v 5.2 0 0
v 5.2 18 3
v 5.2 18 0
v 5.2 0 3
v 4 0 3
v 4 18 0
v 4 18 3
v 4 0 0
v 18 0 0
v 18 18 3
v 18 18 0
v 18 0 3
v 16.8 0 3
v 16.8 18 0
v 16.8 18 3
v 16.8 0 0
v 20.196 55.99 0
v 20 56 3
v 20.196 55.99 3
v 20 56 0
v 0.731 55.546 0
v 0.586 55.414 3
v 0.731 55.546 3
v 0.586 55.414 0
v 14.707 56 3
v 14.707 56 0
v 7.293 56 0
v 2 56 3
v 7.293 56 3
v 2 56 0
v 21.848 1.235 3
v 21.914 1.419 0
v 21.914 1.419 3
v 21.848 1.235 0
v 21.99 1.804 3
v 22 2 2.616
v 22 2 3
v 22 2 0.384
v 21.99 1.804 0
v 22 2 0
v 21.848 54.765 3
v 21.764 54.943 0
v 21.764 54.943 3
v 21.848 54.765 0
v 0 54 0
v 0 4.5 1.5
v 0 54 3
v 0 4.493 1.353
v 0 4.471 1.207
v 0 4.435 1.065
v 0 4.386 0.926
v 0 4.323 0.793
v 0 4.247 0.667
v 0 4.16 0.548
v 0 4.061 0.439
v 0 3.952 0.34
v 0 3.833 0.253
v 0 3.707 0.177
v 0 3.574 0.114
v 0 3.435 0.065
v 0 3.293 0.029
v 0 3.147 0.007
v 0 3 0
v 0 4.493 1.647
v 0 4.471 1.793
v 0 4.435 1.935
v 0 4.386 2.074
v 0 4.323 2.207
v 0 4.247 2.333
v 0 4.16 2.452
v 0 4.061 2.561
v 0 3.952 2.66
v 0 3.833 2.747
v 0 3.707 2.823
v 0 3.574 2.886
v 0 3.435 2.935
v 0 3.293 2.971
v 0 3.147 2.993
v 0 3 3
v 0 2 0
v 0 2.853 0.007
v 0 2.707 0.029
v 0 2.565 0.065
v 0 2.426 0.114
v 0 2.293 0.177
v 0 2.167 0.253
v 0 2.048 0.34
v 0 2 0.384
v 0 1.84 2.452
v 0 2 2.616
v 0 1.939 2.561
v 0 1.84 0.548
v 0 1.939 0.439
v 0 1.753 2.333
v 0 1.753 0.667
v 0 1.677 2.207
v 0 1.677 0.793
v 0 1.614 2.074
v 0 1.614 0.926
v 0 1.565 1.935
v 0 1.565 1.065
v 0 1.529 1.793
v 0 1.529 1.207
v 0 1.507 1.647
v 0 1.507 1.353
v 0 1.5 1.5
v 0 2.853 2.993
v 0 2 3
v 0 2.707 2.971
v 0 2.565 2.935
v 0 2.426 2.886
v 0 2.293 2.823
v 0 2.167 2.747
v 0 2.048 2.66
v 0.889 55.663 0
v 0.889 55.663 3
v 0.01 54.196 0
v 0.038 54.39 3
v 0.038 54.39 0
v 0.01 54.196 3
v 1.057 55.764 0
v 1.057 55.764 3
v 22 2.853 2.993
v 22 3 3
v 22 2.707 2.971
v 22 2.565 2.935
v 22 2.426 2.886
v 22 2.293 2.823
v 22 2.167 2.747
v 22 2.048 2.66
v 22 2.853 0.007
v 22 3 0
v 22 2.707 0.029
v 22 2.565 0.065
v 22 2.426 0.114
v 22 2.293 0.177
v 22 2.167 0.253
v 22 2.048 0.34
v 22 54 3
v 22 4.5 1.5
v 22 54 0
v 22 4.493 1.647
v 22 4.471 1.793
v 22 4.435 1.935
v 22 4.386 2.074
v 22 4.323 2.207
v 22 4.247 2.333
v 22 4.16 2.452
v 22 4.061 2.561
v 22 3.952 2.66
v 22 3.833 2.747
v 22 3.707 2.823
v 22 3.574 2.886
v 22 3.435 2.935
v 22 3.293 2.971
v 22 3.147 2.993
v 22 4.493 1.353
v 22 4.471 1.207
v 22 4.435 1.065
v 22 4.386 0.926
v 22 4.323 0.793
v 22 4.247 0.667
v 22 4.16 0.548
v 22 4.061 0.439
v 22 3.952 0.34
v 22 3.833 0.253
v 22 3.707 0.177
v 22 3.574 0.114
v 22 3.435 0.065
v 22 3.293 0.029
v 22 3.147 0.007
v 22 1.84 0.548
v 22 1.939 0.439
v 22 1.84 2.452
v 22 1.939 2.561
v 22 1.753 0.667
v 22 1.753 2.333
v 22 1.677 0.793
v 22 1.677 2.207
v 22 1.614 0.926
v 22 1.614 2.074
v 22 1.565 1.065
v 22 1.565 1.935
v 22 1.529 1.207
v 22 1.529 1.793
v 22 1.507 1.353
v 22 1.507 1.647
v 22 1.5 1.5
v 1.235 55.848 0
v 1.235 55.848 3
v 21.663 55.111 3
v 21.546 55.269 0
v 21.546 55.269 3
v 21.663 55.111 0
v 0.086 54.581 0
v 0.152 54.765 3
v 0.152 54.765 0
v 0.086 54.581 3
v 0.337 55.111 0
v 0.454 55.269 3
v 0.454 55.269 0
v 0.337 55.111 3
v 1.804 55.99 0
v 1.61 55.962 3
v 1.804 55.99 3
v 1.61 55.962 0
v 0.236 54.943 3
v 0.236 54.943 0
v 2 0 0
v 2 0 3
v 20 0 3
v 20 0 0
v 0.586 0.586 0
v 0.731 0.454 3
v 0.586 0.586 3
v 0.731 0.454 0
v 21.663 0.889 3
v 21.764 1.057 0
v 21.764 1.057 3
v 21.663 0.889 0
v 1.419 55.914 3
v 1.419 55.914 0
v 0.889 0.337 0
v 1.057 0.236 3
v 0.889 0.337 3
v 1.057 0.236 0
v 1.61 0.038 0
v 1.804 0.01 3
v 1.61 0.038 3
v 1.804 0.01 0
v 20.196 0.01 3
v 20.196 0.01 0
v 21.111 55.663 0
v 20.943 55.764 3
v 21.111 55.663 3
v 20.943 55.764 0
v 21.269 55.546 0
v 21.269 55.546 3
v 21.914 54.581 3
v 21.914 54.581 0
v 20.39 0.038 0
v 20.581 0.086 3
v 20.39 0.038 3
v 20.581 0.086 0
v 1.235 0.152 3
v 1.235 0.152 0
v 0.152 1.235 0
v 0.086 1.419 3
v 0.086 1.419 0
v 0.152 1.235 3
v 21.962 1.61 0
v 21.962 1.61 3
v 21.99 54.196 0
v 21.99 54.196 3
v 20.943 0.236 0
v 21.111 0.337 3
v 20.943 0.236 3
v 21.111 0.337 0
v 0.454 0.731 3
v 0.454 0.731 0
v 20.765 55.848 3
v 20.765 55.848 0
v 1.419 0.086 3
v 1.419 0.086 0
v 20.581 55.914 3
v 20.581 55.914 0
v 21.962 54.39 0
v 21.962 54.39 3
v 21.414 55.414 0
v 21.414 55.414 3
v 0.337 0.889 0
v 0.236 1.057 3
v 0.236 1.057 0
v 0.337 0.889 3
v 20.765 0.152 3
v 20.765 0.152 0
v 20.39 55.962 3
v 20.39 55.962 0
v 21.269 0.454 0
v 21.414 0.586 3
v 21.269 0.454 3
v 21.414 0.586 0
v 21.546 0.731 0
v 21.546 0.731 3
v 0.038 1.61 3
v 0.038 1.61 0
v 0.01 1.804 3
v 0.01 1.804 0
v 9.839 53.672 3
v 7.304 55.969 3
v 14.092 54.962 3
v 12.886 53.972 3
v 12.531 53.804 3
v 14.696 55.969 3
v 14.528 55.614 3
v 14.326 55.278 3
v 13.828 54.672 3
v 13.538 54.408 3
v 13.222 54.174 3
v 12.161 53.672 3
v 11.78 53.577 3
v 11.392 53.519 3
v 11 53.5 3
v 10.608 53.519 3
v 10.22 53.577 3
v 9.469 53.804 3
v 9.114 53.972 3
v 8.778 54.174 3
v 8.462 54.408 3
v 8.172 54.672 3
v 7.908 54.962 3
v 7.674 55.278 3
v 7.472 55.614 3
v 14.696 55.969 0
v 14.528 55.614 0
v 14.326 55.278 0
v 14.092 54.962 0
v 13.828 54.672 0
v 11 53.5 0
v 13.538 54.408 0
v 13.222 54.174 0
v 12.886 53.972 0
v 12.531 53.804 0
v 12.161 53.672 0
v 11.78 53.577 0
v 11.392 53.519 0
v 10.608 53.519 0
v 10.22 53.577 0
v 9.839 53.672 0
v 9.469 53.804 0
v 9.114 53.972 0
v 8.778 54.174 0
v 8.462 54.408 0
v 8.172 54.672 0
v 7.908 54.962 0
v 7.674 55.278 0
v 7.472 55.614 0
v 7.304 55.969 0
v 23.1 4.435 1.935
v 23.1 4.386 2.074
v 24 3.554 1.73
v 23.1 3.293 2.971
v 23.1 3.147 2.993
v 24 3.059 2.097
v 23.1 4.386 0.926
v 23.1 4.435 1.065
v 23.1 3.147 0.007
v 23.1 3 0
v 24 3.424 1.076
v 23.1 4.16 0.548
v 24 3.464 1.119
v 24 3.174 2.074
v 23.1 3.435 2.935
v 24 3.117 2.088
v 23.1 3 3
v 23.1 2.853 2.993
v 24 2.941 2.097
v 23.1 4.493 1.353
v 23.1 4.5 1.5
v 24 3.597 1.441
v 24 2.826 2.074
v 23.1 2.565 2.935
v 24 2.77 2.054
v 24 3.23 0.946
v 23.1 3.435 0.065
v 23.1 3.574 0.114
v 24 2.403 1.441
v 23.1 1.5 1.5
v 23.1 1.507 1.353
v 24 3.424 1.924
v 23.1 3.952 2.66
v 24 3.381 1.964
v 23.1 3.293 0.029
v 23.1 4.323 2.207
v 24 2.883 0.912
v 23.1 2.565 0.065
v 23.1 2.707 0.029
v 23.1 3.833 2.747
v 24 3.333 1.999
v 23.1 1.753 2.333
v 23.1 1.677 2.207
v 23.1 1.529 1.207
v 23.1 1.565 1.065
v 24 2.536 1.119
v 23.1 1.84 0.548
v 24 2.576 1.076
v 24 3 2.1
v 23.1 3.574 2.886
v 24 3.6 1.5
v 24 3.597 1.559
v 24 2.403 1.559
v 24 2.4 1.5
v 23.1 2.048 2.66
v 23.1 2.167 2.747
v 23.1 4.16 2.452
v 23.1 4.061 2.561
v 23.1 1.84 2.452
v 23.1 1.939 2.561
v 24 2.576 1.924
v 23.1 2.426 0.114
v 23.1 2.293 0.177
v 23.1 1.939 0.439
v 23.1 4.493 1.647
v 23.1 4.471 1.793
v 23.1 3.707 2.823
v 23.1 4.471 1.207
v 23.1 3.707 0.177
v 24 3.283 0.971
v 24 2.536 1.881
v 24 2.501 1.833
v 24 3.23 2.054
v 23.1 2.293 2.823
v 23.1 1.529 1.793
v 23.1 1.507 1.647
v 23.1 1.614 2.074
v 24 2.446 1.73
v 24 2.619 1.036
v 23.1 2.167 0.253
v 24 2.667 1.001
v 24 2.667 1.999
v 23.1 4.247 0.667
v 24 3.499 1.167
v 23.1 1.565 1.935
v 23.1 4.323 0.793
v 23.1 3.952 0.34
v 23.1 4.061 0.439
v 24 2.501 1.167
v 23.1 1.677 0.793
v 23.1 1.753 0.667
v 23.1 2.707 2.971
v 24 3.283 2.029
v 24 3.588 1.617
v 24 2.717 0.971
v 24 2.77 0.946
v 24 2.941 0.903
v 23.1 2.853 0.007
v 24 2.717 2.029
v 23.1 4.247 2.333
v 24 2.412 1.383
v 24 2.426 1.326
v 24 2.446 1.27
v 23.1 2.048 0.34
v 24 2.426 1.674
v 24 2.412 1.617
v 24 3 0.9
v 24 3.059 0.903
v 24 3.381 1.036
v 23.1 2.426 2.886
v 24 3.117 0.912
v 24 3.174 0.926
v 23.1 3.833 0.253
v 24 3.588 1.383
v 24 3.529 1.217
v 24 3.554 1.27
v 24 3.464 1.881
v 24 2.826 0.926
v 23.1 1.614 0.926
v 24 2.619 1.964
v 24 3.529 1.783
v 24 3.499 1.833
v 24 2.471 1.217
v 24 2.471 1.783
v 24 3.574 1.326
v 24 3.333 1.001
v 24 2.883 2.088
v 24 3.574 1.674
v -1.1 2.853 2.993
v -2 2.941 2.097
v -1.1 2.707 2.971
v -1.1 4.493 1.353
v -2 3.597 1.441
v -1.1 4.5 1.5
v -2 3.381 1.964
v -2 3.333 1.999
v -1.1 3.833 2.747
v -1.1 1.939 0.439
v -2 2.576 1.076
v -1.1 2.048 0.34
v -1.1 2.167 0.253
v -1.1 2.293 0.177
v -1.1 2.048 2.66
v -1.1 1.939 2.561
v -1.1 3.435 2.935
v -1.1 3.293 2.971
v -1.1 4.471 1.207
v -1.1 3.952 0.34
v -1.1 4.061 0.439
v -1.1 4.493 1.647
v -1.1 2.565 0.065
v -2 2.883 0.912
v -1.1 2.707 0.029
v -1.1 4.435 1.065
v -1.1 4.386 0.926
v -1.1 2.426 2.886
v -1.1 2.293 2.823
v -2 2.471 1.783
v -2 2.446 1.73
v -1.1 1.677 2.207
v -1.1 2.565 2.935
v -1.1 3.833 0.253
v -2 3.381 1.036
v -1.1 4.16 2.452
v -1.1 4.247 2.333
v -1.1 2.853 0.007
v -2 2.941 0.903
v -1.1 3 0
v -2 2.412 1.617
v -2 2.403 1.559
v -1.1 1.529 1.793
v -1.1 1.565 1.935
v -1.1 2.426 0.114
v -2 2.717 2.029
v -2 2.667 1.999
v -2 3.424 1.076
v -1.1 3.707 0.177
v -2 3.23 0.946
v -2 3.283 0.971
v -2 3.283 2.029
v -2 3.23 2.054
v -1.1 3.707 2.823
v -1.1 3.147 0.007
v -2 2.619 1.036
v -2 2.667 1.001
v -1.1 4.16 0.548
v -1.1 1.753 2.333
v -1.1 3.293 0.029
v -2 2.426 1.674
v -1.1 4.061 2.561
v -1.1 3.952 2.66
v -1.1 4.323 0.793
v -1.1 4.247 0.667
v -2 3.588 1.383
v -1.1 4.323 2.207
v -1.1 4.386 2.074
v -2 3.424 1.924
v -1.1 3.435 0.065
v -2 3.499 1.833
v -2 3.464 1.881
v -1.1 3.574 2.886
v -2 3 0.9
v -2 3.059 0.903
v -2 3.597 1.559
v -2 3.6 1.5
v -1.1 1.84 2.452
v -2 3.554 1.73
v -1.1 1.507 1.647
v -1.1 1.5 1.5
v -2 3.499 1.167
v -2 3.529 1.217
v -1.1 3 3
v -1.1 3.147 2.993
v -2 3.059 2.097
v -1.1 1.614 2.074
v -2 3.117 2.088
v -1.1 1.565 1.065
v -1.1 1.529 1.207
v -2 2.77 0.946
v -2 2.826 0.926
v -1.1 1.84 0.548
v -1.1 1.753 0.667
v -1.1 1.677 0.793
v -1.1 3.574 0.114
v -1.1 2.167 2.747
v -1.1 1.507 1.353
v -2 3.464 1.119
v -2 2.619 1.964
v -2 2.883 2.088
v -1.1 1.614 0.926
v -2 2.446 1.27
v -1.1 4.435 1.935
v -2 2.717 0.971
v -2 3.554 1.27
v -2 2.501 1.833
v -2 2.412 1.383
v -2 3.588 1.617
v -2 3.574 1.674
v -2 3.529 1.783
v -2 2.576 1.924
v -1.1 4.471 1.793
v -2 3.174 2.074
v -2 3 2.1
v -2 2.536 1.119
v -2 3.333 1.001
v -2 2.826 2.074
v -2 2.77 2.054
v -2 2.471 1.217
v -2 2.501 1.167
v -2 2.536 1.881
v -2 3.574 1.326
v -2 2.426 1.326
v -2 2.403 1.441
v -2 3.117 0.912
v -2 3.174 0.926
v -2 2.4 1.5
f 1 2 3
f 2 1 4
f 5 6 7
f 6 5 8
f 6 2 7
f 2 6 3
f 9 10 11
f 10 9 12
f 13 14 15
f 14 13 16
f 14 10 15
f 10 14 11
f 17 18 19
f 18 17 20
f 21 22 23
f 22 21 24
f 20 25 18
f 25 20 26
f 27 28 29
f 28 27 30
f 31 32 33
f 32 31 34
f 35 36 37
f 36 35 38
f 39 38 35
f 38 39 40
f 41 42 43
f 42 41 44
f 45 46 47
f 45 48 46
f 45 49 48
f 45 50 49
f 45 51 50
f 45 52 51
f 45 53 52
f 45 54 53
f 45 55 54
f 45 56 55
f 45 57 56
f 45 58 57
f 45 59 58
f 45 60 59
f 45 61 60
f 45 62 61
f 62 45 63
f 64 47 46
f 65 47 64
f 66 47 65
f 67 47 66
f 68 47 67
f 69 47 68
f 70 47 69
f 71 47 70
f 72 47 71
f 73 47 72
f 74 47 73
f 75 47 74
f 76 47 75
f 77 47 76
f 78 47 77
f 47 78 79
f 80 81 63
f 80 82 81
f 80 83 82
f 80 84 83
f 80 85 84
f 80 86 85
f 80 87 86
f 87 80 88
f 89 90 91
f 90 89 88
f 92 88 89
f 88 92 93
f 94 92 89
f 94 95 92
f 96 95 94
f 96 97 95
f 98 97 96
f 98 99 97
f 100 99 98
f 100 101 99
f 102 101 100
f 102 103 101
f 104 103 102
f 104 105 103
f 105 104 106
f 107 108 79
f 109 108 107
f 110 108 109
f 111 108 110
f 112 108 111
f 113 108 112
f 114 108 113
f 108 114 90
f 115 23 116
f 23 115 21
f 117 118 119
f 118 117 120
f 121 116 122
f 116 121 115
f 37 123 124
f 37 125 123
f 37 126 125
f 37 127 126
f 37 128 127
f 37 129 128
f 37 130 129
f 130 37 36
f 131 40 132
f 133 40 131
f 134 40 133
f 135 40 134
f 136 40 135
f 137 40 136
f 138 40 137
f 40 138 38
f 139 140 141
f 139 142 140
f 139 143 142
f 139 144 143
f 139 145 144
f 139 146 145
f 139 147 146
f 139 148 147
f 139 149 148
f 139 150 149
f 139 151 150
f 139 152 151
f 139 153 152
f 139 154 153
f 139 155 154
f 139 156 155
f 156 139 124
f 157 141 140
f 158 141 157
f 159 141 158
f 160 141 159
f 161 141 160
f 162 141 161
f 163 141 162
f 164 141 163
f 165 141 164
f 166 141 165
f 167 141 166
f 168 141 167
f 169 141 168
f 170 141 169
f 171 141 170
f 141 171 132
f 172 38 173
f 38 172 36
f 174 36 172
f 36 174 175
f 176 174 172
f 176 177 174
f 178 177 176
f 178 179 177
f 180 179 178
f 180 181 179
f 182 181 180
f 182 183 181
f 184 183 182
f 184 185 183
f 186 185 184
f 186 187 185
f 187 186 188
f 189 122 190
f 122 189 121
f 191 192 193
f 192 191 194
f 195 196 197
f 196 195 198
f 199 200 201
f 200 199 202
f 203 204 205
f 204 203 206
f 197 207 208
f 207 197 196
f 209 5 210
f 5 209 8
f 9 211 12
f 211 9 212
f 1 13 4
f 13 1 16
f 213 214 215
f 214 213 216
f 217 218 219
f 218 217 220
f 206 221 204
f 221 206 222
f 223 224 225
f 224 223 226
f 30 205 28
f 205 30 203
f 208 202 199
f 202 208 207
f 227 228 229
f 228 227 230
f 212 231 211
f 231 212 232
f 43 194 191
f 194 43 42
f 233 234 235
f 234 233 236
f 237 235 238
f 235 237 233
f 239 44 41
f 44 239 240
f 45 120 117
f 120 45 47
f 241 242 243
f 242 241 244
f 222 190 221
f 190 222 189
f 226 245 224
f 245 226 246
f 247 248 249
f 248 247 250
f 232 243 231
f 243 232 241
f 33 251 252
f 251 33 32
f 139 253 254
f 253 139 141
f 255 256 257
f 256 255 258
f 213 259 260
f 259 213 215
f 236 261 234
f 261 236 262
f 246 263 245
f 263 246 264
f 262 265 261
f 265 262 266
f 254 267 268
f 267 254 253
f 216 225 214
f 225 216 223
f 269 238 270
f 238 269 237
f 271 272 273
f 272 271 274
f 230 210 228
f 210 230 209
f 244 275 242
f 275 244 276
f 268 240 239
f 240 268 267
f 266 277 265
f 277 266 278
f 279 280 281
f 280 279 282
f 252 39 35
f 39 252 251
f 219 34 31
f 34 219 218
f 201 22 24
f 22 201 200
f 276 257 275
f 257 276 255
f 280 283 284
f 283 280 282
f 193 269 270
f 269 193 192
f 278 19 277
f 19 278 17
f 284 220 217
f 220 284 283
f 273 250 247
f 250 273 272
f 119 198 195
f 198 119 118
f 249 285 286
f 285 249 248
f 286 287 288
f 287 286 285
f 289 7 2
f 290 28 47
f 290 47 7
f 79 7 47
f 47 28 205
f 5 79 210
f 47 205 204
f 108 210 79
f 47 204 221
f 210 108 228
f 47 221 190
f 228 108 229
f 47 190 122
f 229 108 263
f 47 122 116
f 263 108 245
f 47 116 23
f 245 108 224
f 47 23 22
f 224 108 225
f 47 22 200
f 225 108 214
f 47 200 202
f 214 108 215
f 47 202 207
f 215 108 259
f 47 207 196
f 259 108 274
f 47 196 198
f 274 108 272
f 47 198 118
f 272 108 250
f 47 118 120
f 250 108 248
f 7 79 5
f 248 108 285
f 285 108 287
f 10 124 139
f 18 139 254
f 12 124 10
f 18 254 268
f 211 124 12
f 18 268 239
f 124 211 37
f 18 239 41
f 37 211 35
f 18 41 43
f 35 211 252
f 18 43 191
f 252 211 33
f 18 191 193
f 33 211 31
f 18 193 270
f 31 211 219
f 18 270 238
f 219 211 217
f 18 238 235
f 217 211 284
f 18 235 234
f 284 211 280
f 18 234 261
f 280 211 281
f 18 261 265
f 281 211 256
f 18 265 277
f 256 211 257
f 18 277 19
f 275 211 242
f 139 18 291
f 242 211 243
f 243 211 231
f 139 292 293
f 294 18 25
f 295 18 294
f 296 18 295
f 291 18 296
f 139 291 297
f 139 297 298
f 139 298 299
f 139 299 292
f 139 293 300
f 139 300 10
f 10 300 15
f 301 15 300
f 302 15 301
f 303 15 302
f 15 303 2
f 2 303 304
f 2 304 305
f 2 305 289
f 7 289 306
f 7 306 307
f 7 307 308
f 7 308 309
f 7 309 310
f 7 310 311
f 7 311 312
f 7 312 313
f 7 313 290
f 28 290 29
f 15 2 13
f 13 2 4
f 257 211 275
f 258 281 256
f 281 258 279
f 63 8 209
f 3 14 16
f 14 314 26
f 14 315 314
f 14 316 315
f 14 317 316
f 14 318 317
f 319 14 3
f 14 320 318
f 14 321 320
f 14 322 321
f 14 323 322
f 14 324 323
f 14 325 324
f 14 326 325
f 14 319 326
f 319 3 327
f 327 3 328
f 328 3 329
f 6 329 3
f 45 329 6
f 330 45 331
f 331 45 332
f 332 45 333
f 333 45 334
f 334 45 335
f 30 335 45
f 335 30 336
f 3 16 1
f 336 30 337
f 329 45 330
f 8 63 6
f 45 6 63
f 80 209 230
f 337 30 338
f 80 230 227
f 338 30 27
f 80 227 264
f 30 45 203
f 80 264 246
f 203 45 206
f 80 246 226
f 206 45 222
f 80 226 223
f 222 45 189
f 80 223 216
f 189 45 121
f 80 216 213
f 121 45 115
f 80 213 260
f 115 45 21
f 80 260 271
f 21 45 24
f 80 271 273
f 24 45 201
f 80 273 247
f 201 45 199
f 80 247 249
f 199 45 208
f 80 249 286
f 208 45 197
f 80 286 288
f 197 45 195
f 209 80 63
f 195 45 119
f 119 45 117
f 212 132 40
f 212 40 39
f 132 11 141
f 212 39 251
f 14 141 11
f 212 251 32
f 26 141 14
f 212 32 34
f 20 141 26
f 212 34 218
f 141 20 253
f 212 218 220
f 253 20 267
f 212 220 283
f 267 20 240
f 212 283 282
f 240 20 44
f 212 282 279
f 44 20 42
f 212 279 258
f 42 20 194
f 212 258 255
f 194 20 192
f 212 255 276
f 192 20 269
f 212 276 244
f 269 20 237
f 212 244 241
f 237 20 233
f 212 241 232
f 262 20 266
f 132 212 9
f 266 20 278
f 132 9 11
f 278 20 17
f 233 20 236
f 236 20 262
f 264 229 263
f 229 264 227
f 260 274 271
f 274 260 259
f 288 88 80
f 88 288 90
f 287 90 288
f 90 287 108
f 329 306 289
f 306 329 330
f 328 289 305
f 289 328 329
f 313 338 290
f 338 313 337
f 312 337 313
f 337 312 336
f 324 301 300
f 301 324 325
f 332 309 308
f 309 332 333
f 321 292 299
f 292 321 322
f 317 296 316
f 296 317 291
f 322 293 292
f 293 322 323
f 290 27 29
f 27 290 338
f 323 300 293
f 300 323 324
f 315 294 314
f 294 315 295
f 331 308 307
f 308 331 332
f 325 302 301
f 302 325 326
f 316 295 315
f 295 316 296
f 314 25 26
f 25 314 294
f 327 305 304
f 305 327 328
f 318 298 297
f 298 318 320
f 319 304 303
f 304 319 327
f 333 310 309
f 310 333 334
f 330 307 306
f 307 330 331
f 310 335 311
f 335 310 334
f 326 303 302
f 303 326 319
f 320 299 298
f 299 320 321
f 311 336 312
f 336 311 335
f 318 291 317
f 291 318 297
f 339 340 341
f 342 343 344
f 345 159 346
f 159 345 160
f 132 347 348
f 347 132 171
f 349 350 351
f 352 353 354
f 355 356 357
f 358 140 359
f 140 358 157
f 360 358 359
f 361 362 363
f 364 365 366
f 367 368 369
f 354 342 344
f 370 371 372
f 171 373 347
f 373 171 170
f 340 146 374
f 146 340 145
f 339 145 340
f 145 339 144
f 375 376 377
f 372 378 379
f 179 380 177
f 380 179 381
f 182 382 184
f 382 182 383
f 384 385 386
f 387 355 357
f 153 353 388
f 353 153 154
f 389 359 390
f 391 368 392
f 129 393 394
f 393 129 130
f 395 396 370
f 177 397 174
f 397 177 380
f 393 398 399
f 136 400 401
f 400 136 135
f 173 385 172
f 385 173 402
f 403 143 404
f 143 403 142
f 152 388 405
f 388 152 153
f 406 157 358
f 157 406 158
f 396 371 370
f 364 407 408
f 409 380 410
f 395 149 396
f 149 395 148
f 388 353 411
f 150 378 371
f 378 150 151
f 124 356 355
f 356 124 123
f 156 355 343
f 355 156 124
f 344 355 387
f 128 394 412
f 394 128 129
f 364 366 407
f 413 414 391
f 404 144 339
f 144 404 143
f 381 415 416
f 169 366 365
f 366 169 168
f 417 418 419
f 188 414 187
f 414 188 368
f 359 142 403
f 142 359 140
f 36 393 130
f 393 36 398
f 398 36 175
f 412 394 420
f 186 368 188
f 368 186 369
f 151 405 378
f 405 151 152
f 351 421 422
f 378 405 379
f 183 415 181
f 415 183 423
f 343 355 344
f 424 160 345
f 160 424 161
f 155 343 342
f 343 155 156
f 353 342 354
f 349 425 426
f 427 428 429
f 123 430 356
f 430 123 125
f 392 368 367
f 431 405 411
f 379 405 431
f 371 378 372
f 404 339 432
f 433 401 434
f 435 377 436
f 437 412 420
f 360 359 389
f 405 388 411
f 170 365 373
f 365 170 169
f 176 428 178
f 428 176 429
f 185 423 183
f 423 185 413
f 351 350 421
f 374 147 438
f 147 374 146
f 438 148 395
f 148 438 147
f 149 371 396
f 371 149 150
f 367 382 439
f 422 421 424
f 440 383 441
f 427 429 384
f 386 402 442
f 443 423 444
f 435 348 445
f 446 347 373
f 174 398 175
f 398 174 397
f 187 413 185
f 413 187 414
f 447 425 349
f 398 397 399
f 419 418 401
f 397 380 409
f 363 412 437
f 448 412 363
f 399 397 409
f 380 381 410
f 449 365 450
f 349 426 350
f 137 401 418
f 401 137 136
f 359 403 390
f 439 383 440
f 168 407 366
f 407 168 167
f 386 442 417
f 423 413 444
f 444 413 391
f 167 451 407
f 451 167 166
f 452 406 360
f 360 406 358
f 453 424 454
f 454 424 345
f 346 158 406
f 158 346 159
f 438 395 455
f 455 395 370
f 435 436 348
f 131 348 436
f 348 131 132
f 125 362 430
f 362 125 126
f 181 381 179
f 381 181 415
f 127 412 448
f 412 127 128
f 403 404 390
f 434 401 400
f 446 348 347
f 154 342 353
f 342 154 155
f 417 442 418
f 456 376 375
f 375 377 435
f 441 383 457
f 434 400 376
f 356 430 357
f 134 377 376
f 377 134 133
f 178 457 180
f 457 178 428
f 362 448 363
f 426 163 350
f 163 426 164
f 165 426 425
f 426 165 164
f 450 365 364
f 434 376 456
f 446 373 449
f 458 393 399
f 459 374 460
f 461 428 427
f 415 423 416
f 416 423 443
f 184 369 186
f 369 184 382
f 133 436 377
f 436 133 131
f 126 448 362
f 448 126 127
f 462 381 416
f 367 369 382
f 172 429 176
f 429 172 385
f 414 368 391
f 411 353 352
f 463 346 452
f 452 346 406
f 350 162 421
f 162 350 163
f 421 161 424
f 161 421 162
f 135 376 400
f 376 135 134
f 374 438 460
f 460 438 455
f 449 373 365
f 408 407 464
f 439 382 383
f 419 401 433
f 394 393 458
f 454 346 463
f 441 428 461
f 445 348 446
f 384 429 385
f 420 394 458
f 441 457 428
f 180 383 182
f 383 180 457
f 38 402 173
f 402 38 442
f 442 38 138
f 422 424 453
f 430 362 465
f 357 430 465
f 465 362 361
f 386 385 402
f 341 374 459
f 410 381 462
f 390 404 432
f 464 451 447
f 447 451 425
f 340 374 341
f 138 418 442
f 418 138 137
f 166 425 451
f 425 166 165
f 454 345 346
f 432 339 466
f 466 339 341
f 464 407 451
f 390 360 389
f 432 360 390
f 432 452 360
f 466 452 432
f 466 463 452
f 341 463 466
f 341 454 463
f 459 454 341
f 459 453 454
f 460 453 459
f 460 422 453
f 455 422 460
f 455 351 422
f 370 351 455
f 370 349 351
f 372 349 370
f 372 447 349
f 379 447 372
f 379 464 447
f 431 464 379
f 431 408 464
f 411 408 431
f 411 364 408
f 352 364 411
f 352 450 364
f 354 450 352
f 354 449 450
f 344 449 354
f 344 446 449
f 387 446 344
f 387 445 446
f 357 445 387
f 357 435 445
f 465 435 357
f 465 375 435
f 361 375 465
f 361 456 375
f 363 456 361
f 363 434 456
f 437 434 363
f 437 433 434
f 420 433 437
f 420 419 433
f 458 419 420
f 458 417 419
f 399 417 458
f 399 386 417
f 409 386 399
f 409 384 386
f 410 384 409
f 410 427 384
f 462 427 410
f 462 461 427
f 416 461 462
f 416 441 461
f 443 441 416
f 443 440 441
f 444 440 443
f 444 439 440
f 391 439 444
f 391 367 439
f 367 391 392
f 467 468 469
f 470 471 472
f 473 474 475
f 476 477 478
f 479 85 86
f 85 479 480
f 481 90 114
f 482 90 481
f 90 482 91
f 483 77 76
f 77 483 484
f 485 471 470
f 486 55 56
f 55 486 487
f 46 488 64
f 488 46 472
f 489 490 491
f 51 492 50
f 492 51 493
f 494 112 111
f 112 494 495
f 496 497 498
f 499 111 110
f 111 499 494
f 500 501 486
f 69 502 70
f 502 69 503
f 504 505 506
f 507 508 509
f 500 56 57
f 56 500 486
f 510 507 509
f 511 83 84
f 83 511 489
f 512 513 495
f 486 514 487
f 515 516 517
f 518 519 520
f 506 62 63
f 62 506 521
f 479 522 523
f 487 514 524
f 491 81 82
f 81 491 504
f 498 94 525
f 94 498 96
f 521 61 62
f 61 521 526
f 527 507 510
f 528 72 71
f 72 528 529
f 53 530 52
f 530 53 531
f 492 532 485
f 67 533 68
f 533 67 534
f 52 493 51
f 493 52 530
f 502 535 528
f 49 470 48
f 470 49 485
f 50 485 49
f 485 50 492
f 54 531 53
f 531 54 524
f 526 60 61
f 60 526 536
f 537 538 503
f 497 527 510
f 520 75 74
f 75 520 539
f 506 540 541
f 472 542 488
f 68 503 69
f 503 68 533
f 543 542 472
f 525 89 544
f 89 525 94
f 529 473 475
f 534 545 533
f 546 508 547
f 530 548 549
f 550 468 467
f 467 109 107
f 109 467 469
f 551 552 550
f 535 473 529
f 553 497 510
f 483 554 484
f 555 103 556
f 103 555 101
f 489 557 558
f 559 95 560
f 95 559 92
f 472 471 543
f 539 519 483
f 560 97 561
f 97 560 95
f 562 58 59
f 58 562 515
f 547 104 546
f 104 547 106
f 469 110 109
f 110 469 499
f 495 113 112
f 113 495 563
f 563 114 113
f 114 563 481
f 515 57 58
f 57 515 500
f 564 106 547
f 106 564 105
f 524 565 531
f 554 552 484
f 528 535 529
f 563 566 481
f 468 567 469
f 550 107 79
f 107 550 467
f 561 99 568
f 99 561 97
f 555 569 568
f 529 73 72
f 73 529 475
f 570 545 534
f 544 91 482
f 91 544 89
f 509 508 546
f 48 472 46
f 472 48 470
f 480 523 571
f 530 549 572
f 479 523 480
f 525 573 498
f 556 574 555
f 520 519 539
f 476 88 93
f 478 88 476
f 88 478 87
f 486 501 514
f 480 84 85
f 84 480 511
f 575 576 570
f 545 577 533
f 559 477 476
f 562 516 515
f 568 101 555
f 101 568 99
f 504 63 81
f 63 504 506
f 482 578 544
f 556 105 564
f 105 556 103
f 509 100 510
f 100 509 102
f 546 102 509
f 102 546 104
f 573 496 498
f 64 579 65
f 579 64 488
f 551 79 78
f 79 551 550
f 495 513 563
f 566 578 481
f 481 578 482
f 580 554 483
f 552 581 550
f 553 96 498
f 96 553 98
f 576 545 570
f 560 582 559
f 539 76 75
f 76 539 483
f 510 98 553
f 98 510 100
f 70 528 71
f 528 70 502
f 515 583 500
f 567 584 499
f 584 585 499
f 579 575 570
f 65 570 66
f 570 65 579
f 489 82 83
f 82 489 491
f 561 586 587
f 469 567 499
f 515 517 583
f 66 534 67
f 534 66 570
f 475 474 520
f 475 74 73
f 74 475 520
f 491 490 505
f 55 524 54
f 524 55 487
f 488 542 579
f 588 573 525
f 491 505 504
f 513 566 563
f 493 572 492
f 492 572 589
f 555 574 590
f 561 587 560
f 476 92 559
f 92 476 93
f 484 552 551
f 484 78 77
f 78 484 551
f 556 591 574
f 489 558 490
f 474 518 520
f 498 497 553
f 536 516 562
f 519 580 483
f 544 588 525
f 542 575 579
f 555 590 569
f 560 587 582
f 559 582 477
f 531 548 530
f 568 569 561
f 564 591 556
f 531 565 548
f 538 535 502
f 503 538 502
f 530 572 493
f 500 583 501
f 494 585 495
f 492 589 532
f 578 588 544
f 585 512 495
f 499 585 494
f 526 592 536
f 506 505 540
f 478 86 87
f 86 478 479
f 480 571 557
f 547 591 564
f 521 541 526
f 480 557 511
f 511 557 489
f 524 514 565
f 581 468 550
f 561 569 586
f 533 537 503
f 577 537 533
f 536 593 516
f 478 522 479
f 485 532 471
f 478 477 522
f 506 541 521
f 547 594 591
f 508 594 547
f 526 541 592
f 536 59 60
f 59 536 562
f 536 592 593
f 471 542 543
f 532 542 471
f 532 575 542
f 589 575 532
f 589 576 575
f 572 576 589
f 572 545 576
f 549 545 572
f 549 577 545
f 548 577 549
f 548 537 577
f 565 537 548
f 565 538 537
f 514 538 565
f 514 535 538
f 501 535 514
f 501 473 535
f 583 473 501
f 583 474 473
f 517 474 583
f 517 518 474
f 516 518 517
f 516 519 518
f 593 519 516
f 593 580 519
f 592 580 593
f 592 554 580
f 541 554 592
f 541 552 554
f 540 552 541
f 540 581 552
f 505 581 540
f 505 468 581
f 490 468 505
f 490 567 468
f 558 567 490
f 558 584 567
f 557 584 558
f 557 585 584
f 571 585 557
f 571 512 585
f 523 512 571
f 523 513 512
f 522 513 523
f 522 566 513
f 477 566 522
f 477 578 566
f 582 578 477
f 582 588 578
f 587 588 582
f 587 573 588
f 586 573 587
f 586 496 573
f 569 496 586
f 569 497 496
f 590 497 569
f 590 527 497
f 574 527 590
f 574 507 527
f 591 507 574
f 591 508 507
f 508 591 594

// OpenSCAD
// HelloBaby HB6339 parent-unit kickstand (replacement, 2026-11-06). One part, no hardware.
// A flat plate with two pivot pins at the hinge end that snap into the sockets in the case.
// Measured: 22 mm wide, 56 mm tall. Everything marked GUESS needs calipers before the real print.
// Strength: prints FLAT, pins lie along the bed so filament lines run along each pin (bend-strong).
//   Pin undersides are trimmed flat to sit on the bed (no supports).
// Export: p3d scad monitor_stand        Fit test: p3d scad monitor_stand -D 'part="fit"'
part = "stand";      // "stand" | "fit" (3 short stands with pin_d -0.2 / 0 / +0.2)

w        = 22;       // plate width (between the pin shoulders)
h        = 56;       // plate length, hinge end to foot
t        = 3.0;      // GUESS plate thickness
pin_d    = 3.0;      // GUESS pivot pin diameter (measure the socket hole, subtract 0.2)
pin_len  = 2.0;      // GUESS how far each pin sticks out past the plate side
pin_y    = 3.0;      // GUESS pin centre distance from the hinge end
chamfer  = 0.9;      // lead-in on the pin tips so they snap in
notch_w  = 8;        // finger notch at the foot (0 = none)
slit_w   = 1.2;      // v2: relief slits like the original, so the pin arms flex inward to snap in
slit_len = 18;       // from the hinge end
arm_w    = 4;        // width of each flexing arm (pin side)
$fn = 64;

module tip(d) {      // chamfered pin = straight part + cone at the tip
  hull() {
    intersection() {
      translate([0, 0, t/2]) rotate([0, 90, 0]) cylinder(h = pin_len - chamfer, d = d);
      translate([0, -d, 0]) cube([pin_len, 2*d, t]);
    }
    intersection() {
      translate([0, 0, t/2]) rotate([0, 90, 0]) cylinder(h = pin_len, d = d - 2*chamfer);
      translate([0, -d, 0]) cube([pin_len, 2*d, t]);
    }
  }
}

module stand(d = pin_d, len = h) {
  difference() {
    // plate with rounded corners
    hull() for (x = [2, w-2], y = [2, len-2]) translate([x, y, 0]) cylinder(h = t, r = 2);
    if (notch_w > 0) translate([w/2, len + 1.5, -1]) cylinder(h = t + 2, r = notch_w/2);
    if (slit_w > 0) for (x = [arm_w, w - arm_w - slit_w])
      translate([x, -1, -1]) cube([slit_w, min(slit_len, len - 4) + 1, t + 2]);
  }
  translate([w, pin_y, 0]) tip(d);                         // right pin
  translate([0, pin_y, 0]) mirror([1, 0, 0]) tip(d);       // left pin
}

if (part == "stand") stand();
if (part == "fit")   // short stands (12 mm) just to test the snap, left to right: thin, nominal, thick
  for (i = [0:2]) translate([i * (w + 2*pin_len + 4), 0, 0]) stand(pin_d - 0.2 + 0.2*i, 12);
